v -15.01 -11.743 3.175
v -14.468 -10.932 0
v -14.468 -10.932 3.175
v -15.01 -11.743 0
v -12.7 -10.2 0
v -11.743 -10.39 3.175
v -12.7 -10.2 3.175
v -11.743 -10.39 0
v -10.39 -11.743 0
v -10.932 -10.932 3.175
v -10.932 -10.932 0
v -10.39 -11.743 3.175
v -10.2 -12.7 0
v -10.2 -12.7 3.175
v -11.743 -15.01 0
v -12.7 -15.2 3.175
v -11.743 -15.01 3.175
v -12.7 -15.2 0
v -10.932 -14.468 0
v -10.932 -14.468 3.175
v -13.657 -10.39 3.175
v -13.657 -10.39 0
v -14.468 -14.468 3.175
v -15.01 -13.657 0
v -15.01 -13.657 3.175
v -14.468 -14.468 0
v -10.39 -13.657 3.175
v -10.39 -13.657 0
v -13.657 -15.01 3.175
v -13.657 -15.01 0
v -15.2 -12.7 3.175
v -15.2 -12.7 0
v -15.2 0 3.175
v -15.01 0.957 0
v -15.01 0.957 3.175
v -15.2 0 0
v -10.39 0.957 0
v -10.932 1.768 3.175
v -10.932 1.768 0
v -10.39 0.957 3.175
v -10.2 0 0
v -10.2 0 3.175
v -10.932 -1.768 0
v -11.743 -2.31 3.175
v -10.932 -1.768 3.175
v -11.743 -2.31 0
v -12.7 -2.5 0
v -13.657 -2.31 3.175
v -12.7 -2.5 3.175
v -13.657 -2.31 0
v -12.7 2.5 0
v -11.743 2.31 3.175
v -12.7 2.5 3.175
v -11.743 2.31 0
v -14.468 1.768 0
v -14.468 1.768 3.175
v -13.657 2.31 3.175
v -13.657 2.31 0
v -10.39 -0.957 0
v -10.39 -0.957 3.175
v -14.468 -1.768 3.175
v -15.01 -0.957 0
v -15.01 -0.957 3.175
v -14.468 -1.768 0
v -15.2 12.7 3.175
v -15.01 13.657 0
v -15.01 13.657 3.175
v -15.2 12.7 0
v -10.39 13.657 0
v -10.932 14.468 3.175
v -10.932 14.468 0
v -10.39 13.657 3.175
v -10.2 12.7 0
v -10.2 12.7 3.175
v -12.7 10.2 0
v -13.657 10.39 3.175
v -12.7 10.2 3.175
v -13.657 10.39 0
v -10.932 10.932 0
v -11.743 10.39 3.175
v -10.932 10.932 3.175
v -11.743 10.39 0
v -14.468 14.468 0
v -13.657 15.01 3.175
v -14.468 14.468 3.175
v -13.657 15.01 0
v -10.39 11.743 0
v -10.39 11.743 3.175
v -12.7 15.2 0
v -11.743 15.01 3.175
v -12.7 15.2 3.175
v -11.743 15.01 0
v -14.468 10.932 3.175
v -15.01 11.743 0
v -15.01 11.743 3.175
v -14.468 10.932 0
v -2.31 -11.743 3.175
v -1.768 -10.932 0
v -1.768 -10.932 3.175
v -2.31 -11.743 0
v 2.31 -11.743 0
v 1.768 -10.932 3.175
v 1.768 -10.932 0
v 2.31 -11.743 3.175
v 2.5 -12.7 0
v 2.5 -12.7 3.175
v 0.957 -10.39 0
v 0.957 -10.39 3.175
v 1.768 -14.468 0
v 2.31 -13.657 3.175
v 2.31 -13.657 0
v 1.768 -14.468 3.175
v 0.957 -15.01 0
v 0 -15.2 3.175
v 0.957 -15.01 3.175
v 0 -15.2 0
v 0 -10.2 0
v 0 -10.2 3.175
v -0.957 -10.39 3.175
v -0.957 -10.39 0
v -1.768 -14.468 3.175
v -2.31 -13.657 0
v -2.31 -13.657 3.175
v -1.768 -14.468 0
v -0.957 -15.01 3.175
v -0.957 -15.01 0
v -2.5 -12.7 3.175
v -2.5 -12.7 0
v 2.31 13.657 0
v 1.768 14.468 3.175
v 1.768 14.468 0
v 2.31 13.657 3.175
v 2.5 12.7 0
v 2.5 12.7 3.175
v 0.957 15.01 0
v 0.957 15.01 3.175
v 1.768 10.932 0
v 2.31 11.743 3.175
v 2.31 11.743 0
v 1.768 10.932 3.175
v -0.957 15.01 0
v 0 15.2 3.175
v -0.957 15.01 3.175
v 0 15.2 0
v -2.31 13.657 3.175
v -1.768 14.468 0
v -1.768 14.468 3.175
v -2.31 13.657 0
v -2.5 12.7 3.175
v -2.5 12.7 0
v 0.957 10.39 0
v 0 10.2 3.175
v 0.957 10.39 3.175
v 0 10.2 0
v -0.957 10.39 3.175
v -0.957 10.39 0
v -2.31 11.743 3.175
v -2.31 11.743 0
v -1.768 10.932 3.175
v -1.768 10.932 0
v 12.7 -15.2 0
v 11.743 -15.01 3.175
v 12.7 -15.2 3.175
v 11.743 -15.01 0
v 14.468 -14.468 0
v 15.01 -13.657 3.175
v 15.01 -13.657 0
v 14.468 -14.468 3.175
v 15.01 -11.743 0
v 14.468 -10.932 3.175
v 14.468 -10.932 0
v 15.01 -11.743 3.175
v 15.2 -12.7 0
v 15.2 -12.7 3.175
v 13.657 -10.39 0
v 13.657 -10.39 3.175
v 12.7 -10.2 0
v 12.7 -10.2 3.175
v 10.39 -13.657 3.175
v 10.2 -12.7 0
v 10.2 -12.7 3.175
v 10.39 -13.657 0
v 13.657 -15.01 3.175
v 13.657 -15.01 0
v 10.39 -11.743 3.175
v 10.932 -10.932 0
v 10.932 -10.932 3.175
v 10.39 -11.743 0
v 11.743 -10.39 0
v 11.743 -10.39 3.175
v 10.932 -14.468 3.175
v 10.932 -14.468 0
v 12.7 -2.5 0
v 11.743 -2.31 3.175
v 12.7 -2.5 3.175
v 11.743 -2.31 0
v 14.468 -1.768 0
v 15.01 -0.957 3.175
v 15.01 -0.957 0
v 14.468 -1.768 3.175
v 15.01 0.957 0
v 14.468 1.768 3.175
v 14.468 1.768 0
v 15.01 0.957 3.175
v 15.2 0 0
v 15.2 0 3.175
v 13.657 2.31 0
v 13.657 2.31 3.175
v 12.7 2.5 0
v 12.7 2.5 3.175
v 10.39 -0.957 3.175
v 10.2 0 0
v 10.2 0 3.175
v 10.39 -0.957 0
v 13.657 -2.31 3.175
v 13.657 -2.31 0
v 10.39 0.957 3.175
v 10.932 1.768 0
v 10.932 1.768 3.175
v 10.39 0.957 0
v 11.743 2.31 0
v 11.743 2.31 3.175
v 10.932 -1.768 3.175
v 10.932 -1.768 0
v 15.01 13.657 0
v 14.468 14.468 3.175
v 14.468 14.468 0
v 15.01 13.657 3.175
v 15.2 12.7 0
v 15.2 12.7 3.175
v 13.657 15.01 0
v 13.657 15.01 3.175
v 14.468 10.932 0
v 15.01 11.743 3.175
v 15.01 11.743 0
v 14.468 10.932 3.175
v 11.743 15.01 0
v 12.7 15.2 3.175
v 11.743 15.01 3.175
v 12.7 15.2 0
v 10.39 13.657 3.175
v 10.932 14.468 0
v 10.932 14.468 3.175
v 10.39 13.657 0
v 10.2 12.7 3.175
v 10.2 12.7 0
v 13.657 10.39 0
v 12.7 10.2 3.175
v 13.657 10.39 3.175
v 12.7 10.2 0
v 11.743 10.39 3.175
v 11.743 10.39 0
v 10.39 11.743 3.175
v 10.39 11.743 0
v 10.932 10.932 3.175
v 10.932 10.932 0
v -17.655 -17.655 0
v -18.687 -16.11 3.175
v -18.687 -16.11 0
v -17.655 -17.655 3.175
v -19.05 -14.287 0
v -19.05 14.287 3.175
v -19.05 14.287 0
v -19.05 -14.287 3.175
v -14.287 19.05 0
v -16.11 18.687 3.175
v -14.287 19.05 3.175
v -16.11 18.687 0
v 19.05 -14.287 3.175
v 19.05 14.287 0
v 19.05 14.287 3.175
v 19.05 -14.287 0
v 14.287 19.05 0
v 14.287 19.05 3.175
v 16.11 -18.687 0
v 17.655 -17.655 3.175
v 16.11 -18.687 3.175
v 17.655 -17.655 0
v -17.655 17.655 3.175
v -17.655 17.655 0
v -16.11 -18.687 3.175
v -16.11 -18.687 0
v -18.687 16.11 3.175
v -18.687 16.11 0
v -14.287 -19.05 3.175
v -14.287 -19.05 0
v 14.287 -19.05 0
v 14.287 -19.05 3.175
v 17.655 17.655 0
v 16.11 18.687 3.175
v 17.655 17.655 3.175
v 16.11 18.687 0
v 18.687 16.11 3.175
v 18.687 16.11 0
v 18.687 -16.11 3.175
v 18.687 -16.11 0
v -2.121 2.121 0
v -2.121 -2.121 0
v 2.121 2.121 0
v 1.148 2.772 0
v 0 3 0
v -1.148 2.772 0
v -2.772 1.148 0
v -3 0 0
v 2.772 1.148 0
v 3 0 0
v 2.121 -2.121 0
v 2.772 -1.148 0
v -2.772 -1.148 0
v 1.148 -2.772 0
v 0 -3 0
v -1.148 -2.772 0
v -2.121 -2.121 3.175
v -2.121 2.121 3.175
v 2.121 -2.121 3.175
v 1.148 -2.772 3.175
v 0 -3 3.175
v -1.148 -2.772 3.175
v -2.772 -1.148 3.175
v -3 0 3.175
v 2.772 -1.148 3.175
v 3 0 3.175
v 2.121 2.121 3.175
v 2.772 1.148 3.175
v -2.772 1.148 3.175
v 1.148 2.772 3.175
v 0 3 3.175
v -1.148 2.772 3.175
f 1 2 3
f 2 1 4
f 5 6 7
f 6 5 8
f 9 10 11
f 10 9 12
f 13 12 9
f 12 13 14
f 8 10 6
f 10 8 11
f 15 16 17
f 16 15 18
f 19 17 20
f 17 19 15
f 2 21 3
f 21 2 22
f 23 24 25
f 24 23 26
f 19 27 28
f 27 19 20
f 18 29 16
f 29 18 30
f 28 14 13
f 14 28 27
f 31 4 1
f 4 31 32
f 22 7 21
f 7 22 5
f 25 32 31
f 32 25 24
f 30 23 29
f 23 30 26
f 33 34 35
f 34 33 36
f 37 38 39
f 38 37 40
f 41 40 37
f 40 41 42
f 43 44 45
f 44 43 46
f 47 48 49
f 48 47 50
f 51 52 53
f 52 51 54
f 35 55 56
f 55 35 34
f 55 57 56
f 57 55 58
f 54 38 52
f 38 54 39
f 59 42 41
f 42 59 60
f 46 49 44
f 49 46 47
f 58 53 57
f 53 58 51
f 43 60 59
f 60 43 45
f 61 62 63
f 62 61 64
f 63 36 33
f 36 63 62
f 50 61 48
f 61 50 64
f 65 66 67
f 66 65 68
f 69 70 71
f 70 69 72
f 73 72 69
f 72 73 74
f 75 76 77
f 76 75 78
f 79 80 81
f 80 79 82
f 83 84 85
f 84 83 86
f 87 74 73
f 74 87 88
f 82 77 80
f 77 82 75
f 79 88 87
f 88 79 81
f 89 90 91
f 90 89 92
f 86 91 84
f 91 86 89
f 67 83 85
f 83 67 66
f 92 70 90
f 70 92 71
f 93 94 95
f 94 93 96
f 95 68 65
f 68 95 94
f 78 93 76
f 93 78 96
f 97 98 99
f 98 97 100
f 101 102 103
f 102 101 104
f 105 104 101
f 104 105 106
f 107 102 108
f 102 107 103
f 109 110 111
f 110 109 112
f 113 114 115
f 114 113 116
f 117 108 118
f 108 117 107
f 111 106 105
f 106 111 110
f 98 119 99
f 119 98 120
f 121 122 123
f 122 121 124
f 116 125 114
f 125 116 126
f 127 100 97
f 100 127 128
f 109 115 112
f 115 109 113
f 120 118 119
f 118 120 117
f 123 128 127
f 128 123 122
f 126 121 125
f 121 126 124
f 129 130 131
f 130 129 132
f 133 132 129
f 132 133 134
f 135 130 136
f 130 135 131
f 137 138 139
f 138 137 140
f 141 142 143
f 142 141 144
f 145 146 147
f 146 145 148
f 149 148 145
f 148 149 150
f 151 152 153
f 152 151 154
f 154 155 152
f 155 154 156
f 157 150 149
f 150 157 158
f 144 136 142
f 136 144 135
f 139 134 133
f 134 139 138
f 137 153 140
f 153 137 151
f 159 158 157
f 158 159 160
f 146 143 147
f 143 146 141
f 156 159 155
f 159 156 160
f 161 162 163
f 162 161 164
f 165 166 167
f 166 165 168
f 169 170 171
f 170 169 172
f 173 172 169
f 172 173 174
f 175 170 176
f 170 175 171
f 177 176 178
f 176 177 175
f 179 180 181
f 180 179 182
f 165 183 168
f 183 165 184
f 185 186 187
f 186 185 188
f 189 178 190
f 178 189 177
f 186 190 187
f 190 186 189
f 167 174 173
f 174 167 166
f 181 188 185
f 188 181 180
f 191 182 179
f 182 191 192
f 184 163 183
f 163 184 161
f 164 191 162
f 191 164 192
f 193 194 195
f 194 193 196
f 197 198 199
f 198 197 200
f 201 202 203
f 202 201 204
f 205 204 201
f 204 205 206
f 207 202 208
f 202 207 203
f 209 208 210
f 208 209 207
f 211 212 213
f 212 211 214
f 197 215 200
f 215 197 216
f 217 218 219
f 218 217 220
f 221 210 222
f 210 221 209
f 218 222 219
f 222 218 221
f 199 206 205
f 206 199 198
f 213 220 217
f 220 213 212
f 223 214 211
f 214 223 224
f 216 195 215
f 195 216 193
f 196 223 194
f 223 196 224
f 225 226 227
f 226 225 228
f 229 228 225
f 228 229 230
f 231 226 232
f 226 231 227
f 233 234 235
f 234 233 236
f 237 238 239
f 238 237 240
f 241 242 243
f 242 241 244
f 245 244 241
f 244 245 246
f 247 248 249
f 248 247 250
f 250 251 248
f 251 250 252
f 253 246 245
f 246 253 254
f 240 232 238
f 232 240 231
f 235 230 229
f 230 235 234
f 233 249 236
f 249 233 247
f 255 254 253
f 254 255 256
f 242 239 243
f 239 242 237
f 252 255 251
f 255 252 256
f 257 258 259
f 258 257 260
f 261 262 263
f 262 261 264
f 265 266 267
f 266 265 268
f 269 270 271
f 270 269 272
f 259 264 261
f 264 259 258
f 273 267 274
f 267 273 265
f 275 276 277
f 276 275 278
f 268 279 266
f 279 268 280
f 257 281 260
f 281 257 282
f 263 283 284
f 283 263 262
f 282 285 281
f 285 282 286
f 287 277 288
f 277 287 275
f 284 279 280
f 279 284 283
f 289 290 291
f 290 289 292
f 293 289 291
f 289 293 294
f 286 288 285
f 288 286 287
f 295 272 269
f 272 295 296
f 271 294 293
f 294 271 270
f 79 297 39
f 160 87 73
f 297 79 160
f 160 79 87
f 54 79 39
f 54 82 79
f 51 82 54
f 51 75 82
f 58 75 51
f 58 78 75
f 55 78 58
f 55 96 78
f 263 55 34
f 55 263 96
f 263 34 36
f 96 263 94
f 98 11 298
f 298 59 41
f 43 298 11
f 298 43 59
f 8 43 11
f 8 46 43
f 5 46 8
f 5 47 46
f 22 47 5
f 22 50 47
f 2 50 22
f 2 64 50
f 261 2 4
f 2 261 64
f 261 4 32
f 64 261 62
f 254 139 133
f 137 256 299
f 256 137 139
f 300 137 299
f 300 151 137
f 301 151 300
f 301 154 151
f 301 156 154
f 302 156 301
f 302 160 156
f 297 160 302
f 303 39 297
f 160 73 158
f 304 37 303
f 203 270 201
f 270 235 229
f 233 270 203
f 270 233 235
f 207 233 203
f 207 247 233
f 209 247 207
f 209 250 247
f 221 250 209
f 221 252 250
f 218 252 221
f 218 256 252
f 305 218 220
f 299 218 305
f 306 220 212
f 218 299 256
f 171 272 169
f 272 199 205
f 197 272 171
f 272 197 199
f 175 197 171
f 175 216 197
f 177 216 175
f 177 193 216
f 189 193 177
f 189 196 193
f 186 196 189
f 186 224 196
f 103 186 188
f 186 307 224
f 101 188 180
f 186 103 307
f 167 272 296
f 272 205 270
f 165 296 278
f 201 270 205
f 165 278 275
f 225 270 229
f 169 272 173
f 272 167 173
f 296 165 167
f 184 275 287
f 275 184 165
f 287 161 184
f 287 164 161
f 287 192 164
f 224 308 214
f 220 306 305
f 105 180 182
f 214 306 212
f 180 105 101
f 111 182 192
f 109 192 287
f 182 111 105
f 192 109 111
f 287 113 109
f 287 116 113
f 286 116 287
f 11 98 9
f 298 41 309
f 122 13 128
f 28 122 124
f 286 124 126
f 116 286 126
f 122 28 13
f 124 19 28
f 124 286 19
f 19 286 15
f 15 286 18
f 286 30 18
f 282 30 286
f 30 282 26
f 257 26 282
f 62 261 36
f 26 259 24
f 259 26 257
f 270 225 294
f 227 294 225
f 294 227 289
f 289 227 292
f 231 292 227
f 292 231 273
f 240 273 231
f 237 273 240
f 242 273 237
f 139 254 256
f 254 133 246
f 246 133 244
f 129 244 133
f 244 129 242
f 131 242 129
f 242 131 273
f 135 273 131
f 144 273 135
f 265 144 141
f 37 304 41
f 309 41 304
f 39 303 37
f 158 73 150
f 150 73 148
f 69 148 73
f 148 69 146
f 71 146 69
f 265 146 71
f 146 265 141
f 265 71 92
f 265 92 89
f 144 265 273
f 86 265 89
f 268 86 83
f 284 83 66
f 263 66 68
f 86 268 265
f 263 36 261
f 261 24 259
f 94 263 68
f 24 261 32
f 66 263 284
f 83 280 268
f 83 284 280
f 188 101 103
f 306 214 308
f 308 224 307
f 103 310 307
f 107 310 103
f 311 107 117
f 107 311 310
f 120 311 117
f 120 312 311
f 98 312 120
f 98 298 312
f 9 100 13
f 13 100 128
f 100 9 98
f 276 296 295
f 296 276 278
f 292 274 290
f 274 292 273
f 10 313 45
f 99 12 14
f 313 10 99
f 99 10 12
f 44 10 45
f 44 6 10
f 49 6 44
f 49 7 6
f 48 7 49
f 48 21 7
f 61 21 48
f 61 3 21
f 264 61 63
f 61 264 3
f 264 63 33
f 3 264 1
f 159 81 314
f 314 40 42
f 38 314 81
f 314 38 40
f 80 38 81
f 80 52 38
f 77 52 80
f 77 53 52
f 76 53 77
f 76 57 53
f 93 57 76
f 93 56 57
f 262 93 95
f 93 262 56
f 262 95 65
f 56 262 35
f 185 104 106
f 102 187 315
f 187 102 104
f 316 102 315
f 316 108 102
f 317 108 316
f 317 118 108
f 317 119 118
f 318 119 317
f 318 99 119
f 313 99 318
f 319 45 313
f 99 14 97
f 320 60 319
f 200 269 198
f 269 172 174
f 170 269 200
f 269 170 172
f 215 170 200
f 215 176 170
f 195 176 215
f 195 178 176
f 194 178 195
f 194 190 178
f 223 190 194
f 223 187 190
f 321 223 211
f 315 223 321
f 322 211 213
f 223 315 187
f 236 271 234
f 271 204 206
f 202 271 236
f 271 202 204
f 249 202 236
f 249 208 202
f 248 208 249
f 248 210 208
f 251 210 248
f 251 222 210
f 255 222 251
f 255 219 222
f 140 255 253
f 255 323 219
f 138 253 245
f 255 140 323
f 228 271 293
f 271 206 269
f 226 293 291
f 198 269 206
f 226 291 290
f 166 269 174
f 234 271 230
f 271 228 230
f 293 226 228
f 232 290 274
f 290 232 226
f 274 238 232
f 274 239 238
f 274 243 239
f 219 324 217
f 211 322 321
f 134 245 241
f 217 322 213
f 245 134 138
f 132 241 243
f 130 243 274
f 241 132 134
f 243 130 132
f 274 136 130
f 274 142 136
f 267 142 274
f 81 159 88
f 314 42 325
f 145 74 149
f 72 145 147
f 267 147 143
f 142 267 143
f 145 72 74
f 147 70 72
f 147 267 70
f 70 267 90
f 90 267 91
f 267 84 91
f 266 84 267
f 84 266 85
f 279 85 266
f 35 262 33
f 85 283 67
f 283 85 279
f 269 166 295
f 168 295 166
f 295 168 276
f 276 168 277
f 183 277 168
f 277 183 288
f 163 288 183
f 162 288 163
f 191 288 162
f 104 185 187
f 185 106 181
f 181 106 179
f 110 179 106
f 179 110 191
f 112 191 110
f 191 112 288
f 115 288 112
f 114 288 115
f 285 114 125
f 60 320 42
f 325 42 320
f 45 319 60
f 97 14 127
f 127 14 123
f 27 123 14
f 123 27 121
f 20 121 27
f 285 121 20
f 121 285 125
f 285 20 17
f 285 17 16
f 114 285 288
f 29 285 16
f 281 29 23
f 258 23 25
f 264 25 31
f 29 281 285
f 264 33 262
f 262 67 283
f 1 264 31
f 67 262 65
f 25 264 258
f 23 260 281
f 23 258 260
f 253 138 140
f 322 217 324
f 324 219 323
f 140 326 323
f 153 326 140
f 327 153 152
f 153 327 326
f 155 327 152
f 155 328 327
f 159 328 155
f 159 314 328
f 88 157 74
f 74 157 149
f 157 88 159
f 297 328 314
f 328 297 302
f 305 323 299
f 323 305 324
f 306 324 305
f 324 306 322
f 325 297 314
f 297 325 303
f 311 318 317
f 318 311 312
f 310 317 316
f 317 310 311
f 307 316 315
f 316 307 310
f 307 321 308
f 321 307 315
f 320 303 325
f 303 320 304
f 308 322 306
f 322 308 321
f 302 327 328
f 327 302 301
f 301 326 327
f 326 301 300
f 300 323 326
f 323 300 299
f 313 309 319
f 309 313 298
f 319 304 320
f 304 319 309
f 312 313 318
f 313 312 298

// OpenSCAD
// file: ../lib/TOGGridfinityLib-v1.scad
/* Edge profile point arrays!
 *
 * Should be listed from bottom to top.
 * - X=0 is at the edge of the cell (*not the slightly narrower block*)
 * - Positive X is the offset into the left side
 * - Y=0 is the floor.
 * - Corner profile point lists start with the base
 *   and go upwards to the side.
 */

// Regular block bottom
tog_gridfinity_block_bottom_corner_profile_points = [
	[3.20, 0.00], // Right end of bottom bevel
	[2.40, 0.80],
	[2.40, 2.60],
	[0.25, 4.75], // Top of left bevel
];

// Block lip, with min(X) = 0.25
tog_gridfinity_block_lip_corner_profile_points = [
	[2.85, 0.00], // Right end of bottom bevel
	[2.15, 0.70],
	[2.15, 2.50],
	[0.25, 4.20], // Top tip
];

// Full-cell lip.   Starts at cell edge instead of 0.25 inward for blocks.
// Alternatively one could always use this and just intersect with the block hull,
// (or subtracting the inverse)
// which may be simpler especially if making blocks with a grid on top.
tog_gridfinity_full_lip_corner_profile_points = [
	[2.85, 0.00], // Right end of bottom bevel
	[2.15, 0.70],
	[2.15, 2.50],
	[0.00, 4.65], // Top tip
];

function tog_gridfinity_make_corner_extrudable_points(corner_profile_points, margin, block_height=7, corner_radius=4) = [
	[0, 0],
	for( point=corner_profile_points ) [point[0] - corner_radius, point[1]],
	[margin - corner_radius, block_height],
	[0, block_height],
];

function tog_gridfinity_reverse_list(list) = [
	for( i=[len(list)-1: -1 : 0] ) list[i]
];

/**
 * Reverses the list of points for use as a cutout at the top of a block
 * and also adds some amount of Y
 */
//function tog_gridfinity_adjusted_lip_points(point_list, delta_y=0) = [
//	for( i=[len(list)-1: -1 : 0] ) list[i]
//];

// Extrudable points for an entire block, with lip, filled to the specified height
function tog_gridfinity_make_block_with_lip_extrudable_points( block_height, floor_height=7, corner_radius=4, wall_thickness=2 ) = [
	[0, 0],
	for( point=tog_gridfinity_block_bottom_corner_profile_points ) [point[0] - corner_radius, point[1]],
	for( point=tog_gridfinity_reverse_list(tog_gridfinity_block_lip_corner_profile_points) ) [point[0] - corner_radius, point[1] + block_height],
	each (floor_height == block_height ? [] : [
		// TODO: Really want to filter this list of down-the-inside-of-the-lip points
		// based on being >= floor height.
		// If floor_height is too close to block_height, I imagine this could be a mess:
		[tog_gridfinity_block_lip_corner_profile_points[0][0] - corner_radius, max(floor_height, block_height-2)], // 2 is probably fine; really want a max. 45deg from wall thickness to innermost point in lip
		[wall_thickness+0.25 - corner_radius, max(floor_height, block_height-4)], // difference y=-2 is probably fine; really want a max. 45deg from wall thickness to innermost point in lip
		[wall_thickness+0.25 - corner_radius, floor_height+(corner_radius-wall_thickness-0.25)],
		[0, floor_height],
	]),
	[0, floor_height],,
	//[tog_gridfinity_block_lip_corner_profile_points[0][0] - corner_radius, floor_height],
];

// Create full extrudable polygon where x=0 refers to the pivot point
function tog_gridfinity_make_block_bottom_corner_extrudable_points(block_height=7, corner_radius=4) = tog_gridfinity_make_corner_extrudable_points(
	tog_gridfinity_block_bottom_corner_profile_points,
	0.25,
	block_height=block_height,
	corner_radius=corner_radius
);

module tog_gridfinity_block_from_profile_points(profile_points, block_width=42, corner_radius=4, overlap=0) {
	bottom_z = profile_points[0][1];
	top_z    = profile_points[len(profile_points)-1][1];
	for( r=[0:90:270] ) rotate([0,0,r]) {
		translate([-block_width/2+corner_radius, -block_width/2+corner_radius, 0]) {
			rotate_extrude(angle=90) {
				polygon(profile_points);
			}
		}
		translate([-block_width/2+corner_radius, 0, 0]) {
			rotate([90,0,0]) linear_extrude(block_width-2*corner_radius+overlap*2, center=true) {
				polygon(profile_points);
			}
		}
	}
	translate([0,0,(bottom_z+top_z)/2]) cube([block_width-corner_radius*2+overlap*2, block_width-corner_radius*2+overlap*2, top_z-bottom_z], center=true);
}


/**
 * Hull to be intersected with block bottoms for gridfinity compatibility.
 * Overlap=0 seems to work, but it can be set to a small value, like 1/64,
 * if OpenSCAD gets confused about exactly interfacing surfaces.
 */
module tog_gridfinity_block_bottom(height=14, gridfinity_pitch=42, corner_radius=4, overlap=0) {
	tog_gridfinity_block_from_profile_points(tog_gridfinity_make_block_bottom_corner_extrudable_points(height, corner_radius), gridfinity_pitch, corner_radius, overlap);
}

module tog_gridfinity_block_with_lip(
	height=14, floor_height=7,
	gridfinity_pitch=42, corner_radius=4, overlap=0,
	magnet_hole_diameter=6.5,
	magnet_hole_depth=2.4,
) {
	difference() {
		tog_gridfinity_block_from_profile_points(tog_gridfinity_make_block_with_lip_extrudable_points(height, floor_height, corner_radius), gridfinity_pitch, corner_radius, overlap);
		if( magnet_hole_diameter > 0 && magnet_hole_depth > 0 ) for( ym=[-1,1] ) for( xm=[-1,1] ) {
			translate([13*xm, 13*ym, 0]) cylinder(d=magnet_hole_diameter, h=magnet_hole_depth*2, center=true);
		}
	}
}
// file: ../lib/TOGHoleLib-v1.scad
// TOGHoleLib-v1.5.1
//
// Library of hole shapes!
// Mostly to accommodate counterbored/countersunk screws.
//
// Changes:
// v1.1:
// - Reduced #6 counterunk holes from 8, 4, 2, 5 to  7.5, 3.5, 1.7, 4.5
//   WSITEM-200448 was the first print to use this new, smaller size,
//   and it seems just about perfect, at least as far as the flat top
//   sitting just barely below the surface
// v1.2:
// - Add 'none' hole style, which does nothing
// v1.3:
// - Add 'tog_holelib_get_hole_types()' and `tog_holelib_is_hole_type(name)` functions
// v1.4:
// - Add THL-1013, a hole for the CRE24F2HBBNE SPDT rocker switches I got from DigiKey years ago
// v1.5:
// - Add partial, experimental, unstable support for THL-1021, a square hole for Mini-PV/Dupont connectors
// v1.5.1:
// - tog_holelib_hole1021: change default margins (0.2mm and 0.3mm) and include_pin1_marker (false)

module tog_holelib_countersunk_hole_2(surface_d, neck_d, head_h, depth, bore_d, overhead_bore_d, overhead_bore_height) {
	rotate_extrude() {
		union() {
			// Bore
			polygon([
				[     0  , -depth],
				[bore_d/2, -depth],
				[bore_d/2, -0.01],
				[     0  , -0.01],
			]);
			// Head and headbore
			polygon([
				[              0  ,               -head_h],
				[         neck_d/2,               -head_h],
				// Try to avoid points exactly at the surface:
				[      surface_d/2,                 0.01 ],
				[overhead_bore_d/2,                 0.01 ],
				[overhead_bore_d/2,  overhead_bore_height],
				[              0  ,  overhead_bore_height],
			]);
		}
	}
}

module tog_holelib_countersunk_hole(surface_d, neck_d, head_h, depth, bore_d=-1, overhead_bore_d=0, overhead_bore_height=1) {
	tog_holelib_countersunk_hole_2(surface_d, neck_d, head_h, depth, bore_d == -1 ? neck_d : bore_d, max(surface_d, overhead_bore_d), overhead_bore_height);
}

// Suitable for #6 flatheads
module tog_holelib_hole1001(depth, overhead_bore_height=1) {
	tog_holelib_countersunk_hole(7.5, 3.5, 1.7, depth, 4.5, 0, overhead_bore_height);
}

// Suitable for 1/4" flatheads
module tog_holelib_hole1002(depth, overhead_bore_height=1) {
	inch = 25.4;
	tog_holelib_countersunk_hole(1/2*inch, 1/4*inch, 1/8*inch, depth, 5/16*inch, 0, overhead_bore_height);
}

// Suitable for the 3-way switches I got from DigiKey years ago:
// https://www.digikey.com/en/products/detail/zf-electronics/CRE24F2HBBNE/446073
// (Manufacturer part number: CRE24F2HBBNE, DigiKey part number: CH807-ND)
module tog_holelib_hole1013(
	depth, overhead_bore_height=1,
	hole_length    = 30,
	hole_width     = 12,
	shaft_inner_diameter = 35,
) intersection() {
	// Some hardcoded values:
	shaft_diameter = shaft_inner_diameter+2;

	bevel_length = (shaft_diameter-hole_length)/2;
	bevel_start_z = 0.5;
	
	rotate([-90,0,0]) linear_extrude(hole_width, center=true) polygon([
		[-hole_length/2               ,                           -1],
		[-hole_length/2               , bevel_start_z               ],
		[-hole_length/2 - bevel_length, bevel_start_z + bevel_length],
		[-hole_length/2 - bevel_length,                        depth],
		[+hole_length/2 + bevel_length,                        depth],
		[+hole_length/2 + bevel_length, bevel_start_z + bevel_length],
		[+hole_length/2               , bevel_start_z               ],
		[+hole_length/2               ,                           -1]
	]);

	translate([0,0,-depth-1]) linear_extrude(depth+overhead_bore_height+2) circle(d=shaft_inner_diameter);	
}


/**
 * A wide-at-the-bottom (z=0), narrow (width, height)-at-the-top (z=border) wedge..thing
 */
module tog_holelib_hole1021__widener(width, height, border) {
	polyhedron([
		[-width/2-border, -height/2-border, -border  ],
		[+width/2+border, -height/2-border, -border  ],
		[-width/2-border, +height/2+border, -border  ],
		[+width/2+border, +height/2+border, -border  ],
		[-width/2-border, -height/2-border,         0],
		[+width/2+border, -height/2-border,         0],
		[-width/2-border, +height/2+border,         0],
		[+width/2+border, +height/2+border,         0],
		[-width/2       , -height/2       , +border*2],
		[+width/2       , -height/2       , +border*2],
		[-width/2       , +height/2       , +border*2],
		[+width/2       , +height/2       , +border*2]
	], [
		[2,3,1,0], // bottom
		[2,0,4,6], // flat sides...
		[0,1,5,4],
		[1,3,7,5],
		[3,2,6,7],
		[6,4,8,10], // tapered sides...
		[4,5,9,8],
		[5,7,11,9],
		[7,6,10,11],
		[8,9,11,10] // top
	]);
}

// Experimental/unstable.
// Don't rely on this not changing just yet.
module tog_holelib_hole1021(
	hole_size,
	front_depth = 7,
	depth = 28,
	back_margin = 0.2,
	front_margin = 0.3,
	include_pin1_marker = false,
) rotate([180,0,0]) {
	// This is written upside-down because
	// that's how it was done in the old MiniPVSleeve-v3.
	// But in TOGHoleLib-v1, holes go down!
	back_hole_width   = 2.54 * hole_size[0] + back_margin*2;
	back_hole_height  = 2.54 * hole_size[1] + back_margin*2;
	front_hole_width  = 2.54 * hole_size[0] + front_margin*2;
	front_hole_height = 2.54 * hole_size[1] + front_margin*2;
	taper_dx = front_margin - back_margin;
	taper_dz = taper_dx * 2;
	translate([0, 0, depth/2]) cube([back_hole_width,back_hole_height,depth], true);
	translate([0, 0, front_depth/2]) cube([front_hole_width,front_hole_height,front_depth], true);
	translate([0, 0, front_depth])
		tog_holelib_hole1021__widener(back_hole_width, back_hole_height, taper_dx);
	translate([0, 0, 0])
	   tog_holelib_hole1021__widener(front_hole_width, front_hole_height, 0.5);
	if( include_pin1_marker ) {
		translate([-hole_size[0]*2.54/2 + 0.5, -hole_size[1]*2.54/2 - 1, 0]) cube([1, 1.1, 1], center=true);
	}
}

tog_holelib_hole_types = [
	["THL-1001", "Suitable for #6 flathead"],
	["THL-1002", "Suitable for 1/4\" flathead"],
	// ["THL-1003", "Suitable for #6 hex nuts or pan heads"],
	// ["THL-1004", "Suitable for #6 flathead, but roomier than 1001"],
	// ["THL-1005", "Countersunk for #6 flathead, but can also accept a hex nut"],
	// ["THL-1006", "Counterbored for 1/4\" furniture bolt, weld nut, etc"],
	["THL-1013", "Suitable for CRE24F2HBBNE SPDT rocker switche"],
	// ["THL-1021-(W)x(H)", "Mini-PV sleeve hole"]
	// ["THL-1023", "Counterbored for M3 pan-head screws"],
	// ["THL-1024", "Counterbored for M4 pan-head screws"],
	// ["THL-1025", "Counterbored for M5 pan-head screws"],
];

function tog_holelib_get_hole_types() = tog_holelib_hole_types;

function tog_holelib_is_hole_type(type_name, idx=0) =
	idx > len(tog_holelib_hole_types) ? false :
	tog_holelib_hole_types[idx][0] == type_name ? true :
	tog_holelib_is_hole_type(type_name, idx=idx + 1);

// TODO: Maybe just use TOGHoleLib2 to implement everything roflmao

module tog_holelib_hole(type_name, depth=1000, overhead_bore_height=1) {
	if( type_name == "none" ) {
		// Here so callers don't need to make a special case for it
	} else if( type_name == "THL-1001" ) {
		tog_holelib_hole1001(depth, overhead_bore_height);
	} else if( type_name == "THL-1002" ) {
		tog_holelib_hole1002(depth, overhead_bore_height);
	} else if( type_name == "THL-1013" ) {
		tog_holelib_hole1013(depth, overhead_bore_height);
	} else {
		assert(false, str("Unknown hole type: '", type_name, "'"));
	}
}
// main file
// A 1.5" square with separately-configurable center and outer holes,
// with options to make the hull so that it would fit into a TOGridPile
// (beveled, no foot) or Gridfinity baseplate (which is of questionable value).

// 1/8" = 3.175, 3/16" = 4.7625
thickness = 3.175;
togridpile_compat = false;
gridfinity_compat = false;
corner_radius = 4.7625;
hole_diameter = 5;
center_hole_diameter = 6;
$fn = 16;

include <../lib/TOGHoleLib-v1.scad>;
include <../lib/TOGridPileLib-v1.scad>;
include <../lib/TOGGridfinityLib-v1.scad>;

module spacer_hull(size) {
	tall_size = [size[0], size[1], 100];
	intersection() {
		if(togridpile_compat) translate([0,0,tall_size[2]/2])
			togridpile_hull_of_style("hybrid1", tall_size, offset=-0.1);
		if(gridfinity_compat) tog_gridfinity_block_bottom(tall_size[2]);
		translate([0,0,size[2]/2]) togridpile__xy_rounded_cube(size, corner_radius=corner_radius);
	}
}

difference() {
	spacer_hull([38.1, 38.1, thickness]);
	for( ym=[-1,0,1] ) for( xm=[-1,0,1] ) {
		translate([ym*12.7, xm*12.7, thickness/2]) cylinder(d=hole_diameter, h=thickness*2, center=true); // tog_holelib_hole("THL-1001");
	}
	for( ym=[0] ) for( xm=[0] ) {
		translate([ym*12.7, xm*12.7, thickness/2]) cylinder(d=center_hole_diameter, h=thickness*2, center=true);
	}
}
